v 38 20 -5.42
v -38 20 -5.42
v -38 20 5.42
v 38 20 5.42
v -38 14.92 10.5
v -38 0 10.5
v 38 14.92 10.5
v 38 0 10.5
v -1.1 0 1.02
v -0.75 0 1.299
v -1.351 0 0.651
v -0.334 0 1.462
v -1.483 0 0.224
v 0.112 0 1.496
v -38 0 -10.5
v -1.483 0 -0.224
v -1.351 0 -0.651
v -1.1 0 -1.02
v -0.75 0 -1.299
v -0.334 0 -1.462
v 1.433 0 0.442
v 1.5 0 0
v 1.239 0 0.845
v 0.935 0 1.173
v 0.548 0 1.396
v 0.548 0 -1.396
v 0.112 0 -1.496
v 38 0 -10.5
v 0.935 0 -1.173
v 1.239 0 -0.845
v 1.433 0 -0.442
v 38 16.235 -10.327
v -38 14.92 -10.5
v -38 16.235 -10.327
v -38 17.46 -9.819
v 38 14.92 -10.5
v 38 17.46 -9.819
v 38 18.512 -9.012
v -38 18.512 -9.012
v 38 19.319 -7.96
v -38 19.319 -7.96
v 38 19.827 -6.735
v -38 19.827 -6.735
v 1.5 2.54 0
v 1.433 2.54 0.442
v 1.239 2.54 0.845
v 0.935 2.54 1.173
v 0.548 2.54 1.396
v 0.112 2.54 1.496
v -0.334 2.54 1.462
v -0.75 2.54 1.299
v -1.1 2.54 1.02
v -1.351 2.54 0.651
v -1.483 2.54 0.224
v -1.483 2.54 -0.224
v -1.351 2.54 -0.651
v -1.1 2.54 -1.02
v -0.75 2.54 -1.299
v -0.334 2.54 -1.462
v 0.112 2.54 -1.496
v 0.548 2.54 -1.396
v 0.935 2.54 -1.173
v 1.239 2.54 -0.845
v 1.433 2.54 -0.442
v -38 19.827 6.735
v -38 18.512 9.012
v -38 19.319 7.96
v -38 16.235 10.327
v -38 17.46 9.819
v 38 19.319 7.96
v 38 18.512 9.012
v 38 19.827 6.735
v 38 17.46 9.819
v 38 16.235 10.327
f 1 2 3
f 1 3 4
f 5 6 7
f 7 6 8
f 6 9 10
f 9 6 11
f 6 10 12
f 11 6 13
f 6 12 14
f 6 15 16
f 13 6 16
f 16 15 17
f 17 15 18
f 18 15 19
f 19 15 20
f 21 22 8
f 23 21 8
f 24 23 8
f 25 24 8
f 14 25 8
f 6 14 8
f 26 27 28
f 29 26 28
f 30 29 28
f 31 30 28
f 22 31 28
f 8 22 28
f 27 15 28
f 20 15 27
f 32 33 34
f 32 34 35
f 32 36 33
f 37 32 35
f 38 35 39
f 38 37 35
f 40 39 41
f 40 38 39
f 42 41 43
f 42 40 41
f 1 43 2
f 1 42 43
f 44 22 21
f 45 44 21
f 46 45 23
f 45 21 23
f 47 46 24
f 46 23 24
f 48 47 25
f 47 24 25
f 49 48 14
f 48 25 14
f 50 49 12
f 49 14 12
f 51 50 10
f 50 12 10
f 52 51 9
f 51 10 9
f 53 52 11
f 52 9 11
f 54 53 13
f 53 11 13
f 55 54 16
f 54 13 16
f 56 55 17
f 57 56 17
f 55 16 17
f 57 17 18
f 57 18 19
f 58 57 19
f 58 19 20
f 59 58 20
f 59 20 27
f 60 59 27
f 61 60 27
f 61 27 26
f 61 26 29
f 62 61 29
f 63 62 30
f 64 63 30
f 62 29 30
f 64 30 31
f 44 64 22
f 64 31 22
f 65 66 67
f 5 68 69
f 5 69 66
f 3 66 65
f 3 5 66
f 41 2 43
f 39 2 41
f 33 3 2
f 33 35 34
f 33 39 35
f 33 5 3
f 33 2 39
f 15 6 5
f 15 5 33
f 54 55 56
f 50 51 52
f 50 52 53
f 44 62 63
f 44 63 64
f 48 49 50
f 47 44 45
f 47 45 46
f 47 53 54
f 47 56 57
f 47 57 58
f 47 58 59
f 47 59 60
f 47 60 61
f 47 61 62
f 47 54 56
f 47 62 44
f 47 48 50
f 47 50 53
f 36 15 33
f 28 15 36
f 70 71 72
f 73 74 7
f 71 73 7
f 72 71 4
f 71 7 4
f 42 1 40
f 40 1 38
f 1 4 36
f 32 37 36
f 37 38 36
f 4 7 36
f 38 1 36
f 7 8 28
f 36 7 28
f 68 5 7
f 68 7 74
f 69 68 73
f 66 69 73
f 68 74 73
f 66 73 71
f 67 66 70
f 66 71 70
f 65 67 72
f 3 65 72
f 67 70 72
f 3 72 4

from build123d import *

# Parameters (mm, degrees)
SKETCH1_W           = 76
SKETCH1_H           = 21
BOSS_EXTRUDE1_DEPTH = 20
FILLET1_R           = 5.08
SKETCH2_R           = 1.5
CUT_EXTRUDE1_DEPTH  = 2.54


with BuildPart() as part:
    # Sketch1 → Boss-Extrude1 (new body)
    with BuildSketch(Plane(origin=(0, 0, 0), x_dir=(1, 0, 0), z_dir=(0, 1, 0))):
        Rectangle(SKETCH1_W, SKETCH1_H)
    extrude(amount=BOSS_EXTRUDE1_DEPTH)

    # Fillet1
    fillet1_edges = [part.edges().sort_by_distance(p)[0] for p in [
        (0, 20, 10.5),
        (0, 20, -10.5),
    ]]
    fillet(fillet1_edges, radius=FILLET1_R)

    # Sketch2 → Cut-Extrude1 (cut)
    with BuildSketch(Plane.XZ):
        Circle(SKETCH2_R)
    extrude(amount=-CUT_EXTRUDE1_DEPTH, mode=Mode.SUBTRACT)


solid = part.part
